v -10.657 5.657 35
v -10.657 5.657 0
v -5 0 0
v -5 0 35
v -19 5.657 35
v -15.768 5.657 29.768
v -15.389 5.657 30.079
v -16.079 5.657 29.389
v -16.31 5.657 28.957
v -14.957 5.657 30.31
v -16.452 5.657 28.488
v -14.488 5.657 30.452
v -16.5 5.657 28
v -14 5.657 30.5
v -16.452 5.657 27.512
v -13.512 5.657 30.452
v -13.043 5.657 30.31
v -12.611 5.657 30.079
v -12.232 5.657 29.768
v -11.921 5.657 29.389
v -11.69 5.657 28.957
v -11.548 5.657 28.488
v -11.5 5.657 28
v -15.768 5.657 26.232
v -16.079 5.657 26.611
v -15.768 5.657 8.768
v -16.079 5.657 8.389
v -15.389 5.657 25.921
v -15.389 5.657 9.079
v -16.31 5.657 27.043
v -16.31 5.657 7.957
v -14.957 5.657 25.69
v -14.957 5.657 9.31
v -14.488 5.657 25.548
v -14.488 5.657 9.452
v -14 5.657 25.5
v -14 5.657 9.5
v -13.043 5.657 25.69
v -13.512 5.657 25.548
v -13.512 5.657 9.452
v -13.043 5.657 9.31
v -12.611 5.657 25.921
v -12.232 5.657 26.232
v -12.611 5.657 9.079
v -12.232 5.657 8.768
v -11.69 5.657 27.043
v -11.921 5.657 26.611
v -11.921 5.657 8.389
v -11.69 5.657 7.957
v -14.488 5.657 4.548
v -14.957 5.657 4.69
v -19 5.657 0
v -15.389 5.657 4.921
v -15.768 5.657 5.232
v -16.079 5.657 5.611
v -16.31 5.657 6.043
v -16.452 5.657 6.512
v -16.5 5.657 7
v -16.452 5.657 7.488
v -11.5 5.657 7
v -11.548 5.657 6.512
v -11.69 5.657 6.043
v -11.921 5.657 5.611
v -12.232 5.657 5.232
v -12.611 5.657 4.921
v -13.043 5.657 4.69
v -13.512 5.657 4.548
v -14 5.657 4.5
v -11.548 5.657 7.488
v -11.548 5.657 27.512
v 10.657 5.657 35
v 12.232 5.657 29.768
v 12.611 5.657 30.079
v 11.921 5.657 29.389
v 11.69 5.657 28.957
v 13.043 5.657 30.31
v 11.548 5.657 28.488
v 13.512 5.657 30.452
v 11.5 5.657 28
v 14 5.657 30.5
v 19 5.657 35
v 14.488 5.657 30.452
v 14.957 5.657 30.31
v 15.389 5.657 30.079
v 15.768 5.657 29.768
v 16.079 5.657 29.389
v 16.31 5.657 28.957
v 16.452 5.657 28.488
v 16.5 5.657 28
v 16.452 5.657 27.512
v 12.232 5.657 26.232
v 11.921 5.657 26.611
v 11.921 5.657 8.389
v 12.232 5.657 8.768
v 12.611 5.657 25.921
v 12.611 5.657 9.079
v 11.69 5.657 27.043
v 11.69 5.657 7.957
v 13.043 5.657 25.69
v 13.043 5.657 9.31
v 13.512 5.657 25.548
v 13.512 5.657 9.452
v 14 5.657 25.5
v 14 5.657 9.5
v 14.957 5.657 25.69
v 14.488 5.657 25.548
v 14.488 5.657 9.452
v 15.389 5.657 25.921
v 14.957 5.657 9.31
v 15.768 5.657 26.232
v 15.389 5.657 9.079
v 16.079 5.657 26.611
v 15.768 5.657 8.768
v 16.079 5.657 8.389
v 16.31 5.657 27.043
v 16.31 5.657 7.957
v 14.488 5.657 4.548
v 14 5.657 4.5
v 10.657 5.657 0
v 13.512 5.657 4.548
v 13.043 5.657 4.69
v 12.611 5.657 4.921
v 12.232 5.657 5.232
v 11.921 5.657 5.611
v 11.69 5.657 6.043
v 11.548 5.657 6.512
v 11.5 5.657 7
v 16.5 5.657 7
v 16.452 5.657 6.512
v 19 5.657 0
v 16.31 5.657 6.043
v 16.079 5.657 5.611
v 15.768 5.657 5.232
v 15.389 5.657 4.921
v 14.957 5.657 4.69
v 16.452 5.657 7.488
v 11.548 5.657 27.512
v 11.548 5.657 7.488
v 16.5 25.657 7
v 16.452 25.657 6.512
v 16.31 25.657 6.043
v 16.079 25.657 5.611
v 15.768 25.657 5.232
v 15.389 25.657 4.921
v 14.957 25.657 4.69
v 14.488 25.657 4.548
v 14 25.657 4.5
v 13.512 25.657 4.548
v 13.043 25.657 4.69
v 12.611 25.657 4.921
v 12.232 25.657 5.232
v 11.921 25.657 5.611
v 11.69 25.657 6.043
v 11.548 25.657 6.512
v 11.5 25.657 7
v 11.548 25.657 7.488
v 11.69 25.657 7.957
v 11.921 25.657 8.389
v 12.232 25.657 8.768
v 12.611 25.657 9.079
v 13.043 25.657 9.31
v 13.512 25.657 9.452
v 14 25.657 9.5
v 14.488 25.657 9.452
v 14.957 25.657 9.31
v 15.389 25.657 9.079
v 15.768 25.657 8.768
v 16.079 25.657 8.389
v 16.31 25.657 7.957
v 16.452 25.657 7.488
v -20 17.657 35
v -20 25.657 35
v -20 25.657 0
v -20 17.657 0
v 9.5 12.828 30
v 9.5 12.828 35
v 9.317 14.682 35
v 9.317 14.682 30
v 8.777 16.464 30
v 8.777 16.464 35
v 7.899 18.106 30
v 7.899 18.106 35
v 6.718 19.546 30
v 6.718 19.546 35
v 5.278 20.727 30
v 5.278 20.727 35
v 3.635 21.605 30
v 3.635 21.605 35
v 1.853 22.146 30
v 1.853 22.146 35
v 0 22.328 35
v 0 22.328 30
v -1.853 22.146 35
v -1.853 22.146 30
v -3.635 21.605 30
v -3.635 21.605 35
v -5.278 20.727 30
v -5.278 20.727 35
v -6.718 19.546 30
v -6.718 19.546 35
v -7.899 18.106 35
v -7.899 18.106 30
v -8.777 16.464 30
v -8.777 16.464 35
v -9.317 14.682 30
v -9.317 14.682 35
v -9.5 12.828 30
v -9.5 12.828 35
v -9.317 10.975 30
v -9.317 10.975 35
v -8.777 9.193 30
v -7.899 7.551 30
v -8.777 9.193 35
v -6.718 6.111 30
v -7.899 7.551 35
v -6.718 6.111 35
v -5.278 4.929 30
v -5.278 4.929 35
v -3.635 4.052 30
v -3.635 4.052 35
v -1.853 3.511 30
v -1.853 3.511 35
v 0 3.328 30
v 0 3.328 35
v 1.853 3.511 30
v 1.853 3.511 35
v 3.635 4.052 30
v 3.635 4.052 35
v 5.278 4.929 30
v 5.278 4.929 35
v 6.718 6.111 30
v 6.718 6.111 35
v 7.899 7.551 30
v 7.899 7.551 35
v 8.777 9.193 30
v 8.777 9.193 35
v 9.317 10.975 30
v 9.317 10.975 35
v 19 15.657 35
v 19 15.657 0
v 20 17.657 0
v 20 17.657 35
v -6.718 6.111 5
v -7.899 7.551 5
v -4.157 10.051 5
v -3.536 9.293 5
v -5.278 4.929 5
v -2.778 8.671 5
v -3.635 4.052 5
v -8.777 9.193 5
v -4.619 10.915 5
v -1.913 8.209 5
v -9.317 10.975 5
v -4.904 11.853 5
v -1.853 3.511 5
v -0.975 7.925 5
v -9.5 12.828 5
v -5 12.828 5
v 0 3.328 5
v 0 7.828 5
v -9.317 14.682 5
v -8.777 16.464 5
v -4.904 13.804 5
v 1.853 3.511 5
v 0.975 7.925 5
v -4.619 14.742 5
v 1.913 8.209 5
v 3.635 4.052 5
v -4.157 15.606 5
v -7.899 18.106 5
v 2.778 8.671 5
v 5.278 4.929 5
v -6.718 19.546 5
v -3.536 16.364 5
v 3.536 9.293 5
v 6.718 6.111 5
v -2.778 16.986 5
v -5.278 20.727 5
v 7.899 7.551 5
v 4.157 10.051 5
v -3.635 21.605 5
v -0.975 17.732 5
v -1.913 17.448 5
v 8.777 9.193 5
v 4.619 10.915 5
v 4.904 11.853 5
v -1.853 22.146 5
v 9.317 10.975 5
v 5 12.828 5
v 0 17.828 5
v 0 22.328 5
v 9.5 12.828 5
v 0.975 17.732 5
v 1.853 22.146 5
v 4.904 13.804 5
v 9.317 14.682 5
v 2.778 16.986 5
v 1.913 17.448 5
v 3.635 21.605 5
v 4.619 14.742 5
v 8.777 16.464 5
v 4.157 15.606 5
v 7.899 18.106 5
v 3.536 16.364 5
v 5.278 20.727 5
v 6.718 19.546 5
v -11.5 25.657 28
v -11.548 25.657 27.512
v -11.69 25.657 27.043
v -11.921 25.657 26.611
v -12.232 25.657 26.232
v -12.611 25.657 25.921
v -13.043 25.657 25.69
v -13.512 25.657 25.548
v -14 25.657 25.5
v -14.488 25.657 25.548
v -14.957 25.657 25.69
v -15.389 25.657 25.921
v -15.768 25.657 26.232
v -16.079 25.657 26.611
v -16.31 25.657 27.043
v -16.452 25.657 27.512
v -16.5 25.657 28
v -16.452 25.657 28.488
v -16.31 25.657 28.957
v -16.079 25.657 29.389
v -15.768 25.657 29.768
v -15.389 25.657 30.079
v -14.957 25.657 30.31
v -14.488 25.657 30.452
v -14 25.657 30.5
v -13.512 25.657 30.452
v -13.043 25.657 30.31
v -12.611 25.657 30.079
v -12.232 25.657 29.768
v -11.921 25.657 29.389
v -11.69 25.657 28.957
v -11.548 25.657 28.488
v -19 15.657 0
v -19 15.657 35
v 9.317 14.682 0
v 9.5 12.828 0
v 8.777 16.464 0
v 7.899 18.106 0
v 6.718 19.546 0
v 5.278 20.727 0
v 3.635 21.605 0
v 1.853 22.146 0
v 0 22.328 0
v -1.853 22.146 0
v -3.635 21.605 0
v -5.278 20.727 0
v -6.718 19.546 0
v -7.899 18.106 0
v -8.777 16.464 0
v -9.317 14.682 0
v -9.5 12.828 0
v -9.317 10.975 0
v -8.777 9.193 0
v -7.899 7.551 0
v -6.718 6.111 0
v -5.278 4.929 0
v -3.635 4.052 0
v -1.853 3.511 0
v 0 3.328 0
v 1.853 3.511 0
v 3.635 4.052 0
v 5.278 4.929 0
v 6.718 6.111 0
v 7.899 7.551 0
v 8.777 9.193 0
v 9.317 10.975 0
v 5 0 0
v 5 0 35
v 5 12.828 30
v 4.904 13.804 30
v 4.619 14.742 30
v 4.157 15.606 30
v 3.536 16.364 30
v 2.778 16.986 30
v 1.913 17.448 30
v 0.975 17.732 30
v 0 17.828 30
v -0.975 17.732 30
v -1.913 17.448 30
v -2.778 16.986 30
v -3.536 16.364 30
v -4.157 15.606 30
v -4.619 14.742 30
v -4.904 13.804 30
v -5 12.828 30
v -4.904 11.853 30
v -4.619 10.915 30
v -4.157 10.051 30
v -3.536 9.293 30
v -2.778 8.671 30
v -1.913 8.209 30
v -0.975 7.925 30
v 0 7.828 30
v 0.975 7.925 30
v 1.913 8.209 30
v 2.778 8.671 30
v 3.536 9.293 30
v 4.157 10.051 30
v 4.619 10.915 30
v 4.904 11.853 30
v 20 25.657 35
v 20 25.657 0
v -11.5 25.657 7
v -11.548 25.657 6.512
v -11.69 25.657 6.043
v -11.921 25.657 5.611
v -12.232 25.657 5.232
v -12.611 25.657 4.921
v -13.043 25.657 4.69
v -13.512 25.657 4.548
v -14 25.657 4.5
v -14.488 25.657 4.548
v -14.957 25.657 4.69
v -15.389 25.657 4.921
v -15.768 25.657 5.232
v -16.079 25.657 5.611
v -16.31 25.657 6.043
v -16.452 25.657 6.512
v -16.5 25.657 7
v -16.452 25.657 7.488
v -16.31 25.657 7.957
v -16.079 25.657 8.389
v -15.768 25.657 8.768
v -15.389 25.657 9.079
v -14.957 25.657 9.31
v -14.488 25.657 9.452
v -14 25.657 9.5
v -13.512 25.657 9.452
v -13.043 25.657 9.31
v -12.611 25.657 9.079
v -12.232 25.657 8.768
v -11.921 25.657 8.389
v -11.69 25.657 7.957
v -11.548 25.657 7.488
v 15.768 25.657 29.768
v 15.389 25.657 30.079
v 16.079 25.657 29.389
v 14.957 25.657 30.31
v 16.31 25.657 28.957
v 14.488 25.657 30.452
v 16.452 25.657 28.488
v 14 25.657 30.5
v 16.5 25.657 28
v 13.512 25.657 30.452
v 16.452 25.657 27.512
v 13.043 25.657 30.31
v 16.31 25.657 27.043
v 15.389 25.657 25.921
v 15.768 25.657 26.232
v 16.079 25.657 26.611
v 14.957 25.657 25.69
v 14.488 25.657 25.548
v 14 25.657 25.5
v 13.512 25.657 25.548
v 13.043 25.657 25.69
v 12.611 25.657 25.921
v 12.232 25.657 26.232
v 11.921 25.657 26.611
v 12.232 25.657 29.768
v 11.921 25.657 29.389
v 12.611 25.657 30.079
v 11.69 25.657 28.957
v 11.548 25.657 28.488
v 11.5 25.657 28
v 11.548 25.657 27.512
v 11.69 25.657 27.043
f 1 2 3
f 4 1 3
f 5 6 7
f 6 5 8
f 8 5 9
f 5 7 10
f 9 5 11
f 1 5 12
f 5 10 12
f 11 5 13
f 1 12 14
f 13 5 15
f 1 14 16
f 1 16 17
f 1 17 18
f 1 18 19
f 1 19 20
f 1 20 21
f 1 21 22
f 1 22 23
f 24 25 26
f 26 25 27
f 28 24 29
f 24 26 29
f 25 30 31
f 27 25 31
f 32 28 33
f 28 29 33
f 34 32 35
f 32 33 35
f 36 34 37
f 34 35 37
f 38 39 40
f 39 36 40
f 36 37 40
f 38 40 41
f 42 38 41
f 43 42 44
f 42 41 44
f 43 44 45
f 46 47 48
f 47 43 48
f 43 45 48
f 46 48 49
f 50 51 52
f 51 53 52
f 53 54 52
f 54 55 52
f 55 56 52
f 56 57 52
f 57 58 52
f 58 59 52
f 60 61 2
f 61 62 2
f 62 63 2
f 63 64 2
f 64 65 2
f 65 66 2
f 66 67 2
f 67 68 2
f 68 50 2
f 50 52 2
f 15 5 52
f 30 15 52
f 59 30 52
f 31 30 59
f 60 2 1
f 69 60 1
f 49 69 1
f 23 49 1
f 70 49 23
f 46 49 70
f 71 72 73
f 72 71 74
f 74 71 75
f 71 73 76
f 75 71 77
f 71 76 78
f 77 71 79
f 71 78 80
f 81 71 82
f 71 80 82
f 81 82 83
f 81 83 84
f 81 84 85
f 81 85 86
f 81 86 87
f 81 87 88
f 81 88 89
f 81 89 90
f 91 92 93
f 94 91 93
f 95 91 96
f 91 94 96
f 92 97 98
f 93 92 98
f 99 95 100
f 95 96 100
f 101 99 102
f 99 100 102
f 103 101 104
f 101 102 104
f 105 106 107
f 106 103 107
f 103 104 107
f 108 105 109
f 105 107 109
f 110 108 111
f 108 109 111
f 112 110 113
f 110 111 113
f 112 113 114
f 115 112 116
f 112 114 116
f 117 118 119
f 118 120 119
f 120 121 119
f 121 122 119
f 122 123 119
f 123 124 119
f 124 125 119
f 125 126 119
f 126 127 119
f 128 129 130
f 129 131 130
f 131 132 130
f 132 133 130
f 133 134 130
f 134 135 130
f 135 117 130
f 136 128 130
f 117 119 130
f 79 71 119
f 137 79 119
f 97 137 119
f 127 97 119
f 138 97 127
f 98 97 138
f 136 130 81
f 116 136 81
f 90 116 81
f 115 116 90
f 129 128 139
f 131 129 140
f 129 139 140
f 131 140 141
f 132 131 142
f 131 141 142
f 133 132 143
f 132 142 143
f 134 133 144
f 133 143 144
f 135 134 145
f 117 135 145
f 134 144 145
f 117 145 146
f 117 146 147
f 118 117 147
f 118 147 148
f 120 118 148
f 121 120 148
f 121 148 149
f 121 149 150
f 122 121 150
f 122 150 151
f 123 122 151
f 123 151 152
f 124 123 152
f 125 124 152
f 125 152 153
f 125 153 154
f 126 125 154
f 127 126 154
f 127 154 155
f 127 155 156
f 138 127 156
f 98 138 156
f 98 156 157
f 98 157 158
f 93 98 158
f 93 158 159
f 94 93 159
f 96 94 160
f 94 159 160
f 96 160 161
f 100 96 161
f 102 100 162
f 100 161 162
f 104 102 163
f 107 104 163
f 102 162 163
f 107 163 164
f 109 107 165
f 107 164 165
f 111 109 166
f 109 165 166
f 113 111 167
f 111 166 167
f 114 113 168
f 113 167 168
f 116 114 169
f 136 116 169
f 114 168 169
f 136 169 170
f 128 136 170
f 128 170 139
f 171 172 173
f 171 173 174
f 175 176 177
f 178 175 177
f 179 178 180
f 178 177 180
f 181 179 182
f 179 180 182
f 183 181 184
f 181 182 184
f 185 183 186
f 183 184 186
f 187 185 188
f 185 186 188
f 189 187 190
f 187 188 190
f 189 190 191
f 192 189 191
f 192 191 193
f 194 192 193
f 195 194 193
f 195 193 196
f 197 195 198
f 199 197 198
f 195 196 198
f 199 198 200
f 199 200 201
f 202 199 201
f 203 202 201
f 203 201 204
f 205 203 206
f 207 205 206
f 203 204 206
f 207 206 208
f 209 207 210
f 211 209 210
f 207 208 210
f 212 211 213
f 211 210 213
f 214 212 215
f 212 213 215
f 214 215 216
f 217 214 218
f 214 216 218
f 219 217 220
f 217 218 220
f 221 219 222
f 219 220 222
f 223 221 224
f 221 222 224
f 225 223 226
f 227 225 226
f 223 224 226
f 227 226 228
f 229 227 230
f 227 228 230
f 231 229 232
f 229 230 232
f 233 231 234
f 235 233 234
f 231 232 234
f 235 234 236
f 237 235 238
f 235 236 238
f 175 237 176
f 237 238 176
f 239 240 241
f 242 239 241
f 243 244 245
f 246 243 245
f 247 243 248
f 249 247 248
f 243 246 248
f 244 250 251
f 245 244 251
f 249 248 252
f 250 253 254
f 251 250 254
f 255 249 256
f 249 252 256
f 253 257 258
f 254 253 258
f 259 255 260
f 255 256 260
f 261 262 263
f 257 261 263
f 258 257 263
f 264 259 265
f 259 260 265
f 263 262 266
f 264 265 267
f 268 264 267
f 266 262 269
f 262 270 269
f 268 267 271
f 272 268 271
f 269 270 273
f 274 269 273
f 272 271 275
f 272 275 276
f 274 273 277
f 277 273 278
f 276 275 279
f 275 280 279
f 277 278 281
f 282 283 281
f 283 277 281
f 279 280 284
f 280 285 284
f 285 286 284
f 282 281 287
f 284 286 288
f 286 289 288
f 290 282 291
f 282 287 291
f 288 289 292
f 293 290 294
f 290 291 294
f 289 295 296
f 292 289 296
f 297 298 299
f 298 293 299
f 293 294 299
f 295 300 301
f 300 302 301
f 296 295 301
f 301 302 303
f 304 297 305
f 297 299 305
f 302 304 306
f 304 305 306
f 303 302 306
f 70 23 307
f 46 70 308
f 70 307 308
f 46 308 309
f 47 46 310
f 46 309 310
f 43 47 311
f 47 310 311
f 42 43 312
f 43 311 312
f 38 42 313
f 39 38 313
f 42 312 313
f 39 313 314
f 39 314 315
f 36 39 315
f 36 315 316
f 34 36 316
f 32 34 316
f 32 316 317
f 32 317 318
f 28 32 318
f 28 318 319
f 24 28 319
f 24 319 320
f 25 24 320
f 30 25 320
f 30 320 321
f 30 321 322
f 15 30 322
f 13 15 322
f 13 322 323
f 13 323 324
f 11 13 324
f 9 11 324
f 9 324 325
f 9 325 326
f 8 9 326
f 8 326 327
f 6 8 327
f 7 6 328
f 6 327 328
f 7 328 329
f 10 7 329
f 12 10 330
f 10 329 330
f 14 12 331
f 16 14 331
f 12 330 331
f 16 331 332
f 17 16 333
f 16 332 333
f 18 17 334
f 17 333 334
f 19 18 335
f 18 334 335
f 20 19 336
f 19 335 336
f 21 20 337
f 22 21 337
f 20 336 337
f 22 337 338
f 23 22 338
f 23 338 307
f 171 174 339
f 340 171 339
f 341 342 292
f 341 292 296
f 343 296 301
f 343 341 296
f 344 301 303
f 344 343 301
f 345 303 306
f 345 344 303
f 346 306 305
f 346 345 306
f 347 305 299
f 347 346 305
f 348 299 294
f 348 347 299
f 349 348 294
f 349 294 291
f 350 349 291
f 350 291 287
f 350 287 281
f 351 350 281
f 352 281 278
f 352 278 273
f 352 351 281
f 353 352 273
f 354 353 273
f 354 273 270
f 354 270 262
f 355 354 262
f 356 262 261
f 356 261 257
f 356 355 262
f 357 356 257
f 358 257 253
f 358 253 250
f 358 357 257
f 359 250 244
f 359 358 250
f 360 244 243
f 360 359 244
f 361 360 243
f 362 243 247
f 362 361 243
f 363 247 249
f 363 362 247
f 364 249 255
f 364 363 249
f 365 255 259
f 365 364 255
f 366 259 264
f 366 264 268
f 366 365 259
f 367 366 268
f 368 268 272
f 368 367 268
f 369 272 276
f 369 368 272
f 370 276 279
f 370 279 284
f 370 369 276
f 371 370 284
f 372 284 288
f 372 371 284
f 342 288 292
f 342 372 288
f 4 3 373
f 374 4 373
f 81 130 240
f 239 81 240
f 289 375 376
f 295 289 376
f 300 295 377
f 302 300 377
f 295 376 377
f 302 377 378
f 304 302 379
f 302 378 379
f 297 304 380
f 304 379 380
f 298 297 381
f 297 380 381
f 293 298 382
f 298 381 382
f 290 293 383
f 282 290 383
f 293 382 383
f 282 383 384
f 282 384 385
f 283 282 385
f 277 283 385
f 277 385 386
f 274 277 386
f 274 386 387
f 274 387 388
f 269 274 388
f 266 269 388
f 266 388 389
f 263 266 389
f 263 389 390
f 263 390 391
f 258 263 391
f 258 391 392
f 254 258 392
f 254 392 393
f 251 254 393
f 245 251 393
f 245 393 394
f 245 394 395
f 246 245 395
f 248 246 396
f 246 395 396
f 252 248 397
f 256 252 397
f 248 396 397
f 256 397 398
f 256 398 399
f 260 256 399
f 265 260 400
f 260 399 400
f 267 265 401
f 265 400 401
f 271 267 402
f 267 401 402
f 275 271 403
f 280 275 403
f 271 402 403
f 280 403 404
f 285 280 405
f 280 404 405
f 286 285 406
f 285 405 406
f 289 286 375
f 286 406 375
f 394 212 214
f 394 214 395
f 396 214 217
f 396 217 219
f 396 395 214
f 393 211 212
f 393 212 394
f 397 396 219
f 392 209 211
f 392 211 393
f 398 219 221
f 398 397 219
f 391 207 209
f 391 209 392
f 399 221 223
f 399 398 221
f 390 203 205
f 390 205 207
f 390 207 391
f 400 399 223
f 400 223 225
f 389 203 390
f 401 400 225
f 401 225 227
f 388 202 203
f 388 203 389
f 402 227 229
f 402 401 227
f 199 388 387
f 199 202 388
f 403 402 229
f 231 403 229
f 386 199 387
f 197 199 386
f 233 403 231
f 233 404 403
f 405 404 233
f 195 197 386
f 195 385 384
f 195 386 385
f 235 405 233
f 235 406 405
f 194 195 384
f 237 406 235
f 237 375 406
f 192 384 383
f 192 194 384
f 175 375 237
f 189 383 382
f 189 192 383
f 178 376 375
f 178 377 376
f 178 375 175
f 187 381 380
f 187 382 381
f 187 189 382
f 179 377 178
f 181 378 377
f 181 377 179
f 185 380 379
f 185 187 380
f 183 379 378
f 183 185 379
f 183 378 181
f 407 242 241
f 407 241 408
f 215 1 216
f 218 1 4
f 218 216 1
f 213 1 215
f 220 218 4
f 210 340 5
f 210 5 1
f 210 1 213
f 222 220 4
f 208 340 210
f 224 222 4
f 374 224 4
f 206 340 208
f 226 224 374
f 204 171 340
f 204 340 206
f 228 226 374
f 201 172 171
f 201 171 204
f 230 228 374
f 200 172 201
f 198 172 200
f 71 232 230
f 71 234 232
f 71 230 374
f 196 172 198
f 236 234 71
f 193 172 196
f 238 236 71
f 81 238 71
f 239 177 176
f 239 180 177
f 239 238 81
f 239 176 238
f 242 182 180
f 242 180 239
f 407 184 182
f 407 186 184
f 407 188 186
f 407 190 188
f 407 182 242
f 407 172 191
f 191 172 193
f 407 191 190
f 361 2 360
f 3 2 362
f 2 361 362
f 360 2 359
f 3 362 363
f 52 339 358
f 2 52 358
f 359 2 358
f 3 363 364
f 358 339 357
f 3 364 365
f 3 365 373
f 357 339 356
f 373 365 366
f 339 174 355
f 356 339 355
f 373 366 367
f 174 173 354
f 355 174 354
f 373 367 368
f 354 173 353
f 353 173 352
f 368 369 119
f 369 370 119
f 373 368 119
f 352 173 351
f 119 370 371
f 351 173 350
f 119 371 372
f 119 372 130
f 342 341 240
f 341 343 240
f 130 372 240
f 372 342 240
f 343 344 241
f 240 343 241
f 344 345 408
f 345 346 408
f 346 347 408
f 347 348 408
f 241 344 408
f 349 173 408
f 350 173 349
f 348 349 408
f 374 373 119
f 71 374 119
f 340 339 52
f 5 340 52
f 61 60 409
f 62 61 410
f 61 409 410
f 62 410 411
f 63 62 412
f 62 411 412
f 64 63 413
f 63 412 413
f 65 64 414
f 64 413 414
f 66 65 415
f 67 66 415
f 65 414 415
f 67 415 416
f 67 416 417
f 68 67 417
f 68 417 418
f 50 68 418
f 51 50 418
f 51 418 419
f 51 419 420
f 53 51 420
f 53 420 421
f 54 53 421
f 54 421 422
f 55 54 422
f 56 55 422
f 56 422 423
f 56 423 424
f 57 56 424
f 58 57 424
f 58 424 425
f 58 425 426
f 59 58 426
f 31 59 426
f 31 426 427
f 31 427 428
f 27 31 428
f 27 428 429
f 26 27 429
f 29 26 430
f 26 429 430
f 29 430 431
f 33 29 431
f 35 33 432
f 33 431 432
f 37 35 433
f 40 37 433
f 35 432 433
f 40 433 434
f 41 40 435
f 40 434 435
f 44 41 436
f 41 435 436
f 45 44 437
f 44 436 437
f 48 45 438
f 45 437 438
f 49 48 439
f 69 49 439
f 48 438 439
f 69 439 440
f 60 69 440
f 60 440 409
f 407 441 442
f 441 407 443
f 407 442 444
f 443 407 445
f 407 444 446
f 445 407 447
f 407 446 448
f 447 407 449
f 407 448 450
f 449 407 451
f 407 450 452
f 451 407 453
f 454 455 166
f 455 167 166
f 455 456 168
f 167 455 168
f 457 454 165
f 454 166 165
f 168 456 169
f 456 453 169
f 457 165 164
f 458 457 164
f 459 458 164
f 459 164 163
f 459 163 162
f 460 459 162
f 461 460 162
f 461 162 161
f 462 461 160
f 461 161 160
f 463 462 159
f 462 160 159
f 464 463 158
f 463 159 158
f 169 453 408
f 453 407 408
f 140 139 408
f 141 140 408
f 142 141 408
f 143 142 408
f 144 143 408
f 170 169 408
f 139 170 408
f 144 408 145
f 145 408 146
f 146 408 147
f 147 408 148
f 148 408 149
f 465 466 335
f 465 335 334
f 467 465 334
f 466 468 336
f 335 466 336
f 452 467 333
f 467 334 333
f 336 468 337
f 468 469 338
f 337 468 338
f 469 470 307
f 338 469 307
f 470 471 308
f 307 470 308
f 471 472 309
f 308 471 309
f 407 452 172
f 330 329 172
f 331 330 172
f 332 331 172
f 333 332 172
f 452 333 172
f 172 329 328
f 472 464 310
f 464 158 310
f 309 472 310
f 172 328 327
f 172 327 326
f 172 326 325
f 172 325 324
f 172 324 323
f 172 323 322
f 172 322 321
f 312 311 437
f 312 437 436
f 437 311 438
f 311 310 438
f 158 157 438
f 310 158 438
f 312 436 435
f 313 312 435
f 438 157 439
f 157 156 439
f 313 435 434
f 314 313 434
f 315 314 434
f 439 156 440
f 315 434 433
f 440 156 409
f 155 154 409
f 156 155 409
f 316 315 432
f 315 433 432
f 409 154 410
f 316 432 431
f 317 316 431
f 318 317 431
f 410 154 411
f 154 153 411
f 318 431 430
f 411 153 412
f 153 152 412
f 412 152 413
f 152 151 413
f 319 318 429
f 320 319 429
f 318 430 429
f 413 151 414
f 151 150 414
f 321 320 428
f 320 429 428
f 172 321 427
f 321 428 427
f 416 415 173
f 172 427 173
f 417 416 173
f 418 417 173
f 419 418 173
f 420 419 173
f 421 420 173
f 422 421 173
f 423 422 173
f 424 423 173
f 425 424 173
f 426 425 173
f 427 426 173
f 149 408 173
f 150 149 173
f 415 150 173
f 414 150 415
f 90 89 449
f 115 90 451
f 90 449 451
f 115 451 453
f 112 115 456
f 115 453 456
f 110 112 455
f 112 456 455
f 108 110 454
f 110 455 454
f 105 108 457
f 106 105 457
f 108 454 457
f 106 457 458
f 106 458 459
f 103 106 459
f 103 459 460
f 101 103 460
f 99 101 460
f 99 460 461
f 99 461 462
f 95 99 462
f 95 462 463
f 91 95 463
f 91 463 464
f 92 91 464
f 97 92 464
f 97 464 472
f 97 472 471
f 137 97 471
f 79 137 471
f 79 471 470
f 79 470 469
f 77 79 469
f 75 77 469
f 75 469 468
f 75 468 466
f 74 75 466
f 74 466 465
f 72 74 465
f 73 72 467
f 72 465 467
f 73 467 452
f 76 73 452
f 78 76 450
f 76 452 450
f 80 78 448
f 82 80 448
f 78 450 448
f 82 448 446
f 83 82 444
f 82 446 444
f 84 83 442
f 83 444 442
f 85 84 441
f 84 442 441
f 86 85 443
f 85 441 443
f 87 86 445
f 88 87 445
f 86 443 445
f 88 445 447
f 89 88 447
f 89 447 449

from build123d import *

# Parameters (mm, degrees)
BOSS_EXTRUDE1_DEPTH = 35
SKETCH3_R           = 9.5
CUT_EXTRUDE1_DEPTH  = 5
SKETCH4_R           = 5
CUT_EXTRUDE2_DEPTH  = 31
SKETCH5_R           = 2.5
CUT_EXTRUDE3_DEPTH  = 26.656854249


with BuildPart() as part:
    # Sketch2 → Boss-Extrude1 (new body)
    with BuildSketch(Plane.XY):
        Polygon((-5, 0), (5, 0), (10.656854249, 5.656854249), (19, 5.656854249), (19, 15.656854249), (20, 17.656854249), (20, 25.656854249), (-20, 25.656854249), (-20, 17.656854249), (-19, 15.656854249), (-19, 5.656854249), (-10.656854249, 5.656854249), align=None)
    extrude(amount=BOSS_EXTRUDE1_DEPTH)

    # Sketch3 → Cut-Extrude1 (cut)
    with BuildSketch(Plane.XY.offset(35)):
        with Locations((0, 12.828427125)):
            Circle(SKETCH3_R)
    cut_extrude1 = extrude(amount=-CUT_EXTRUDE1_DEPTH, mode=Mode.SUBTRACT)

    # Sketch4 → Cut-Extrude2 (cut, through all)
    with BuildSketch(Plane.XY.offset(30)):
        with Locations((0, 12.828427125)):
            Circle(SKETCH4_R)
    extrude(amount=-CUT_EXTRUDE2_DEPTH, mode=Mode.SUBTRACT)

    # Mirror1: Cut-Extrude1 across plane
    add(cut_extrude1.mirror(Plane.XY.offset(17.5)), mode=Mode.SUBTRACT)

    # Sketch5 → Cut-Extrude3 (cut, through all)
    with BuildSketch(Plane(origin=(0, 25.656854249, 0), x_dir=(1, 0, 0), z_dir=(0, 1, 0))):
        with Locations((-14, -7)):
            Circle(SKETCH5_R)
        with Locations((14, -7)):
            Circle(SKETCH5_R)
        with Locations((14, -28)):
            Circle(SKETCH5_R)
        with Locations((-14, -28)):
            Circle(SKETCH5_R)
    extrude(amount=-CUT_EXTRUDE3_DEPTH, mode=Mode.SUBTRACT)


solid = part.part
